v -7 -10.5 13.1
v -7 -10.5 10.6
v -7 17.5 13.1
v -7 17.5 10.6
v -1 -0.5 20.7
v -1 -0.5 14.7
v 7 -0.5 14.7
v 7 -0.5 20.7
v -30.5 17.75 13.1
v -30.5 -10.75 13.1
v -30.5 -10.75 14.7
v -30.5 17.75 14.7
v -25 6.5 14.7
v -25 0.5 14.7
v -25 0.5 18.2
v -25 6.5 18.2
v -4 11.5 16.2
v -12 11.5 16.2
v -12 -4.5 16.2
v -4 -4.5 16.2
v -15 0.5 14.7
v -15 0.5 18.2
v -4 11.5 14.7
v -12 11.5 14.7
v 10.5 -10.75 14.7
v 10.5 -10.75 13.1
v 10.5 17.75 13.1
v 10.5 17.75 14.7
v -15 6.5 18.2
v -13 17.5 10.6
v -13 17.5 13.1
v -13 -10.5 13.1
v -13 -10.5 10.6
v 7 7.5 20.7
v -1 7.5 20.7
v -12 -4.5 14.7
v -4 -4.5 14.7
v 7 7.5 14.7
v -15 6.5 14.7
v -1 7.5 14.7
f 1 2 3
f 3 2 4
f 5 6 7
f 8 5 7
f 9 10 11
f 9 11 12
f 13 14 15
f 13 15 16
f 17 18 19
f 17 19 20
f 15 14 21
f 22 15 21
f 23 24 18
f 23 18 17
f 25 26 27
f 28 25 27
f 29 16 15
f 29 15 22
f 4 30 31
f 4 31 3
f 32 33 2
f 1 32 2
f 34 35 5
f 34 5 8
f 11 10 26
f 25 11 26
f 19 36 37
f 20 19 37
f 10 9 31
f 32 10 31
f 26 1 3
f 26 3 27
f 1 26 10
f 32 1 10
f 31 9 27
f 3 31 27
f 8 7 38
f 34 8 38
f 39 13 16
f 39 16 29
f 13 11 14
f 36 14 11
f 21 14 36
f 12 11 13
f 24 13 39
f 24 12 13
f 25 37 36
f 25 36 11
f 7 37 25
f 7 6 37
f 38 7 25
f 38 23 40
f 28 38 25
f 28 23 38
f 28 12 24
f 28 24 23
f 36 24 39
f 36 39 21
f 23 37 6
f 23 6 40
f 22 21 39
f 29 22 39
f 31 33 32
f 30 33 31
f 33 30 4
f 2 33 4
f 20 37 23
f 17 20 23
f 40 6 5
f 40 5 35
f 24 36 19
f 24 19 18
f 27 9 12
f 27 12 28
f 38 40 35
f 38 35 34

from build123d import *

# Parameters (mm, degrees)
SKETCH1_W           = 41
SKETCH1_H           = 28.5
BOSS_EXTRUDE1_DEPTH = 1.6
SKETCH2_W           = 6
SKETCH2_H           = 28
BOSS_EXTRUDE2_DEPTH = 2.5
SKETCH3_W           = 8
SKETCH3_H           = 8
BOSS_EXTRUDE3_DEPTH = 6
SKETCH4_W           = 10
SKETCH4_H           = 6
BOSS_EXTRUDE4_DEPTH = 3.5
SKETCH5_W           = 8
SKETCH5_H           = 16
BOSS_EXTRUDE5_DEPTH = 1.5


with BuildPart() as part:
    # Sketch1 → Boss-Extrude1 (new body)
    with BuildSketch(Plane.XY.offset(13.1)):
        with Locations((-10, 3.5)):
            Rectangle(SKETCH1_W, SKETCH1_H)
    extrude(amount=BOSS_EXTRUDE1_DEPTH)

    # Sketch2 → Boss-Extrude2 (add)
    with BuildSketch(Plane.XY.offset(10.6)):
        with Locations((-10, 3.5)):
            Rectangle(SKETCH2_W, SKETCH2_H)
    extrude(amount=BOSS_EXTRUDE2_DEPTH)

    # Sketch3 → Boss-Extrude3 (add)
    with BuildSketch(Plane.XY.offset(14.7)):
        with Locations((3, 3.5)):
            Rectangle(SKETCH3_W, SKETCH3_H)
    extrude(amount=BOSS_EXTRUDE3_DEPTH)

    # Sketch4 → Boss-Extrude4 (add)
    with BuildSketch(Plane.XY.offset(14.7)):
        with Locations((-20, 3.5)):
            Rectangle(SKETCH4_W, SKETCH4_H)
    extrude(amount=BOSS_EXTRUDE4_DEPTH)

    # Sketch5 → Boss-Extrude5 (add)
    with BuildSketch(Plane.XY.offset(14.7)):
        with Locations((-8, 3.5)):
            Rectangle(SKETCH5_W, SKETCH5_H)
    extrude(amount=BOSS_EXTRUDE5_DEPTH)


solid = part.part
